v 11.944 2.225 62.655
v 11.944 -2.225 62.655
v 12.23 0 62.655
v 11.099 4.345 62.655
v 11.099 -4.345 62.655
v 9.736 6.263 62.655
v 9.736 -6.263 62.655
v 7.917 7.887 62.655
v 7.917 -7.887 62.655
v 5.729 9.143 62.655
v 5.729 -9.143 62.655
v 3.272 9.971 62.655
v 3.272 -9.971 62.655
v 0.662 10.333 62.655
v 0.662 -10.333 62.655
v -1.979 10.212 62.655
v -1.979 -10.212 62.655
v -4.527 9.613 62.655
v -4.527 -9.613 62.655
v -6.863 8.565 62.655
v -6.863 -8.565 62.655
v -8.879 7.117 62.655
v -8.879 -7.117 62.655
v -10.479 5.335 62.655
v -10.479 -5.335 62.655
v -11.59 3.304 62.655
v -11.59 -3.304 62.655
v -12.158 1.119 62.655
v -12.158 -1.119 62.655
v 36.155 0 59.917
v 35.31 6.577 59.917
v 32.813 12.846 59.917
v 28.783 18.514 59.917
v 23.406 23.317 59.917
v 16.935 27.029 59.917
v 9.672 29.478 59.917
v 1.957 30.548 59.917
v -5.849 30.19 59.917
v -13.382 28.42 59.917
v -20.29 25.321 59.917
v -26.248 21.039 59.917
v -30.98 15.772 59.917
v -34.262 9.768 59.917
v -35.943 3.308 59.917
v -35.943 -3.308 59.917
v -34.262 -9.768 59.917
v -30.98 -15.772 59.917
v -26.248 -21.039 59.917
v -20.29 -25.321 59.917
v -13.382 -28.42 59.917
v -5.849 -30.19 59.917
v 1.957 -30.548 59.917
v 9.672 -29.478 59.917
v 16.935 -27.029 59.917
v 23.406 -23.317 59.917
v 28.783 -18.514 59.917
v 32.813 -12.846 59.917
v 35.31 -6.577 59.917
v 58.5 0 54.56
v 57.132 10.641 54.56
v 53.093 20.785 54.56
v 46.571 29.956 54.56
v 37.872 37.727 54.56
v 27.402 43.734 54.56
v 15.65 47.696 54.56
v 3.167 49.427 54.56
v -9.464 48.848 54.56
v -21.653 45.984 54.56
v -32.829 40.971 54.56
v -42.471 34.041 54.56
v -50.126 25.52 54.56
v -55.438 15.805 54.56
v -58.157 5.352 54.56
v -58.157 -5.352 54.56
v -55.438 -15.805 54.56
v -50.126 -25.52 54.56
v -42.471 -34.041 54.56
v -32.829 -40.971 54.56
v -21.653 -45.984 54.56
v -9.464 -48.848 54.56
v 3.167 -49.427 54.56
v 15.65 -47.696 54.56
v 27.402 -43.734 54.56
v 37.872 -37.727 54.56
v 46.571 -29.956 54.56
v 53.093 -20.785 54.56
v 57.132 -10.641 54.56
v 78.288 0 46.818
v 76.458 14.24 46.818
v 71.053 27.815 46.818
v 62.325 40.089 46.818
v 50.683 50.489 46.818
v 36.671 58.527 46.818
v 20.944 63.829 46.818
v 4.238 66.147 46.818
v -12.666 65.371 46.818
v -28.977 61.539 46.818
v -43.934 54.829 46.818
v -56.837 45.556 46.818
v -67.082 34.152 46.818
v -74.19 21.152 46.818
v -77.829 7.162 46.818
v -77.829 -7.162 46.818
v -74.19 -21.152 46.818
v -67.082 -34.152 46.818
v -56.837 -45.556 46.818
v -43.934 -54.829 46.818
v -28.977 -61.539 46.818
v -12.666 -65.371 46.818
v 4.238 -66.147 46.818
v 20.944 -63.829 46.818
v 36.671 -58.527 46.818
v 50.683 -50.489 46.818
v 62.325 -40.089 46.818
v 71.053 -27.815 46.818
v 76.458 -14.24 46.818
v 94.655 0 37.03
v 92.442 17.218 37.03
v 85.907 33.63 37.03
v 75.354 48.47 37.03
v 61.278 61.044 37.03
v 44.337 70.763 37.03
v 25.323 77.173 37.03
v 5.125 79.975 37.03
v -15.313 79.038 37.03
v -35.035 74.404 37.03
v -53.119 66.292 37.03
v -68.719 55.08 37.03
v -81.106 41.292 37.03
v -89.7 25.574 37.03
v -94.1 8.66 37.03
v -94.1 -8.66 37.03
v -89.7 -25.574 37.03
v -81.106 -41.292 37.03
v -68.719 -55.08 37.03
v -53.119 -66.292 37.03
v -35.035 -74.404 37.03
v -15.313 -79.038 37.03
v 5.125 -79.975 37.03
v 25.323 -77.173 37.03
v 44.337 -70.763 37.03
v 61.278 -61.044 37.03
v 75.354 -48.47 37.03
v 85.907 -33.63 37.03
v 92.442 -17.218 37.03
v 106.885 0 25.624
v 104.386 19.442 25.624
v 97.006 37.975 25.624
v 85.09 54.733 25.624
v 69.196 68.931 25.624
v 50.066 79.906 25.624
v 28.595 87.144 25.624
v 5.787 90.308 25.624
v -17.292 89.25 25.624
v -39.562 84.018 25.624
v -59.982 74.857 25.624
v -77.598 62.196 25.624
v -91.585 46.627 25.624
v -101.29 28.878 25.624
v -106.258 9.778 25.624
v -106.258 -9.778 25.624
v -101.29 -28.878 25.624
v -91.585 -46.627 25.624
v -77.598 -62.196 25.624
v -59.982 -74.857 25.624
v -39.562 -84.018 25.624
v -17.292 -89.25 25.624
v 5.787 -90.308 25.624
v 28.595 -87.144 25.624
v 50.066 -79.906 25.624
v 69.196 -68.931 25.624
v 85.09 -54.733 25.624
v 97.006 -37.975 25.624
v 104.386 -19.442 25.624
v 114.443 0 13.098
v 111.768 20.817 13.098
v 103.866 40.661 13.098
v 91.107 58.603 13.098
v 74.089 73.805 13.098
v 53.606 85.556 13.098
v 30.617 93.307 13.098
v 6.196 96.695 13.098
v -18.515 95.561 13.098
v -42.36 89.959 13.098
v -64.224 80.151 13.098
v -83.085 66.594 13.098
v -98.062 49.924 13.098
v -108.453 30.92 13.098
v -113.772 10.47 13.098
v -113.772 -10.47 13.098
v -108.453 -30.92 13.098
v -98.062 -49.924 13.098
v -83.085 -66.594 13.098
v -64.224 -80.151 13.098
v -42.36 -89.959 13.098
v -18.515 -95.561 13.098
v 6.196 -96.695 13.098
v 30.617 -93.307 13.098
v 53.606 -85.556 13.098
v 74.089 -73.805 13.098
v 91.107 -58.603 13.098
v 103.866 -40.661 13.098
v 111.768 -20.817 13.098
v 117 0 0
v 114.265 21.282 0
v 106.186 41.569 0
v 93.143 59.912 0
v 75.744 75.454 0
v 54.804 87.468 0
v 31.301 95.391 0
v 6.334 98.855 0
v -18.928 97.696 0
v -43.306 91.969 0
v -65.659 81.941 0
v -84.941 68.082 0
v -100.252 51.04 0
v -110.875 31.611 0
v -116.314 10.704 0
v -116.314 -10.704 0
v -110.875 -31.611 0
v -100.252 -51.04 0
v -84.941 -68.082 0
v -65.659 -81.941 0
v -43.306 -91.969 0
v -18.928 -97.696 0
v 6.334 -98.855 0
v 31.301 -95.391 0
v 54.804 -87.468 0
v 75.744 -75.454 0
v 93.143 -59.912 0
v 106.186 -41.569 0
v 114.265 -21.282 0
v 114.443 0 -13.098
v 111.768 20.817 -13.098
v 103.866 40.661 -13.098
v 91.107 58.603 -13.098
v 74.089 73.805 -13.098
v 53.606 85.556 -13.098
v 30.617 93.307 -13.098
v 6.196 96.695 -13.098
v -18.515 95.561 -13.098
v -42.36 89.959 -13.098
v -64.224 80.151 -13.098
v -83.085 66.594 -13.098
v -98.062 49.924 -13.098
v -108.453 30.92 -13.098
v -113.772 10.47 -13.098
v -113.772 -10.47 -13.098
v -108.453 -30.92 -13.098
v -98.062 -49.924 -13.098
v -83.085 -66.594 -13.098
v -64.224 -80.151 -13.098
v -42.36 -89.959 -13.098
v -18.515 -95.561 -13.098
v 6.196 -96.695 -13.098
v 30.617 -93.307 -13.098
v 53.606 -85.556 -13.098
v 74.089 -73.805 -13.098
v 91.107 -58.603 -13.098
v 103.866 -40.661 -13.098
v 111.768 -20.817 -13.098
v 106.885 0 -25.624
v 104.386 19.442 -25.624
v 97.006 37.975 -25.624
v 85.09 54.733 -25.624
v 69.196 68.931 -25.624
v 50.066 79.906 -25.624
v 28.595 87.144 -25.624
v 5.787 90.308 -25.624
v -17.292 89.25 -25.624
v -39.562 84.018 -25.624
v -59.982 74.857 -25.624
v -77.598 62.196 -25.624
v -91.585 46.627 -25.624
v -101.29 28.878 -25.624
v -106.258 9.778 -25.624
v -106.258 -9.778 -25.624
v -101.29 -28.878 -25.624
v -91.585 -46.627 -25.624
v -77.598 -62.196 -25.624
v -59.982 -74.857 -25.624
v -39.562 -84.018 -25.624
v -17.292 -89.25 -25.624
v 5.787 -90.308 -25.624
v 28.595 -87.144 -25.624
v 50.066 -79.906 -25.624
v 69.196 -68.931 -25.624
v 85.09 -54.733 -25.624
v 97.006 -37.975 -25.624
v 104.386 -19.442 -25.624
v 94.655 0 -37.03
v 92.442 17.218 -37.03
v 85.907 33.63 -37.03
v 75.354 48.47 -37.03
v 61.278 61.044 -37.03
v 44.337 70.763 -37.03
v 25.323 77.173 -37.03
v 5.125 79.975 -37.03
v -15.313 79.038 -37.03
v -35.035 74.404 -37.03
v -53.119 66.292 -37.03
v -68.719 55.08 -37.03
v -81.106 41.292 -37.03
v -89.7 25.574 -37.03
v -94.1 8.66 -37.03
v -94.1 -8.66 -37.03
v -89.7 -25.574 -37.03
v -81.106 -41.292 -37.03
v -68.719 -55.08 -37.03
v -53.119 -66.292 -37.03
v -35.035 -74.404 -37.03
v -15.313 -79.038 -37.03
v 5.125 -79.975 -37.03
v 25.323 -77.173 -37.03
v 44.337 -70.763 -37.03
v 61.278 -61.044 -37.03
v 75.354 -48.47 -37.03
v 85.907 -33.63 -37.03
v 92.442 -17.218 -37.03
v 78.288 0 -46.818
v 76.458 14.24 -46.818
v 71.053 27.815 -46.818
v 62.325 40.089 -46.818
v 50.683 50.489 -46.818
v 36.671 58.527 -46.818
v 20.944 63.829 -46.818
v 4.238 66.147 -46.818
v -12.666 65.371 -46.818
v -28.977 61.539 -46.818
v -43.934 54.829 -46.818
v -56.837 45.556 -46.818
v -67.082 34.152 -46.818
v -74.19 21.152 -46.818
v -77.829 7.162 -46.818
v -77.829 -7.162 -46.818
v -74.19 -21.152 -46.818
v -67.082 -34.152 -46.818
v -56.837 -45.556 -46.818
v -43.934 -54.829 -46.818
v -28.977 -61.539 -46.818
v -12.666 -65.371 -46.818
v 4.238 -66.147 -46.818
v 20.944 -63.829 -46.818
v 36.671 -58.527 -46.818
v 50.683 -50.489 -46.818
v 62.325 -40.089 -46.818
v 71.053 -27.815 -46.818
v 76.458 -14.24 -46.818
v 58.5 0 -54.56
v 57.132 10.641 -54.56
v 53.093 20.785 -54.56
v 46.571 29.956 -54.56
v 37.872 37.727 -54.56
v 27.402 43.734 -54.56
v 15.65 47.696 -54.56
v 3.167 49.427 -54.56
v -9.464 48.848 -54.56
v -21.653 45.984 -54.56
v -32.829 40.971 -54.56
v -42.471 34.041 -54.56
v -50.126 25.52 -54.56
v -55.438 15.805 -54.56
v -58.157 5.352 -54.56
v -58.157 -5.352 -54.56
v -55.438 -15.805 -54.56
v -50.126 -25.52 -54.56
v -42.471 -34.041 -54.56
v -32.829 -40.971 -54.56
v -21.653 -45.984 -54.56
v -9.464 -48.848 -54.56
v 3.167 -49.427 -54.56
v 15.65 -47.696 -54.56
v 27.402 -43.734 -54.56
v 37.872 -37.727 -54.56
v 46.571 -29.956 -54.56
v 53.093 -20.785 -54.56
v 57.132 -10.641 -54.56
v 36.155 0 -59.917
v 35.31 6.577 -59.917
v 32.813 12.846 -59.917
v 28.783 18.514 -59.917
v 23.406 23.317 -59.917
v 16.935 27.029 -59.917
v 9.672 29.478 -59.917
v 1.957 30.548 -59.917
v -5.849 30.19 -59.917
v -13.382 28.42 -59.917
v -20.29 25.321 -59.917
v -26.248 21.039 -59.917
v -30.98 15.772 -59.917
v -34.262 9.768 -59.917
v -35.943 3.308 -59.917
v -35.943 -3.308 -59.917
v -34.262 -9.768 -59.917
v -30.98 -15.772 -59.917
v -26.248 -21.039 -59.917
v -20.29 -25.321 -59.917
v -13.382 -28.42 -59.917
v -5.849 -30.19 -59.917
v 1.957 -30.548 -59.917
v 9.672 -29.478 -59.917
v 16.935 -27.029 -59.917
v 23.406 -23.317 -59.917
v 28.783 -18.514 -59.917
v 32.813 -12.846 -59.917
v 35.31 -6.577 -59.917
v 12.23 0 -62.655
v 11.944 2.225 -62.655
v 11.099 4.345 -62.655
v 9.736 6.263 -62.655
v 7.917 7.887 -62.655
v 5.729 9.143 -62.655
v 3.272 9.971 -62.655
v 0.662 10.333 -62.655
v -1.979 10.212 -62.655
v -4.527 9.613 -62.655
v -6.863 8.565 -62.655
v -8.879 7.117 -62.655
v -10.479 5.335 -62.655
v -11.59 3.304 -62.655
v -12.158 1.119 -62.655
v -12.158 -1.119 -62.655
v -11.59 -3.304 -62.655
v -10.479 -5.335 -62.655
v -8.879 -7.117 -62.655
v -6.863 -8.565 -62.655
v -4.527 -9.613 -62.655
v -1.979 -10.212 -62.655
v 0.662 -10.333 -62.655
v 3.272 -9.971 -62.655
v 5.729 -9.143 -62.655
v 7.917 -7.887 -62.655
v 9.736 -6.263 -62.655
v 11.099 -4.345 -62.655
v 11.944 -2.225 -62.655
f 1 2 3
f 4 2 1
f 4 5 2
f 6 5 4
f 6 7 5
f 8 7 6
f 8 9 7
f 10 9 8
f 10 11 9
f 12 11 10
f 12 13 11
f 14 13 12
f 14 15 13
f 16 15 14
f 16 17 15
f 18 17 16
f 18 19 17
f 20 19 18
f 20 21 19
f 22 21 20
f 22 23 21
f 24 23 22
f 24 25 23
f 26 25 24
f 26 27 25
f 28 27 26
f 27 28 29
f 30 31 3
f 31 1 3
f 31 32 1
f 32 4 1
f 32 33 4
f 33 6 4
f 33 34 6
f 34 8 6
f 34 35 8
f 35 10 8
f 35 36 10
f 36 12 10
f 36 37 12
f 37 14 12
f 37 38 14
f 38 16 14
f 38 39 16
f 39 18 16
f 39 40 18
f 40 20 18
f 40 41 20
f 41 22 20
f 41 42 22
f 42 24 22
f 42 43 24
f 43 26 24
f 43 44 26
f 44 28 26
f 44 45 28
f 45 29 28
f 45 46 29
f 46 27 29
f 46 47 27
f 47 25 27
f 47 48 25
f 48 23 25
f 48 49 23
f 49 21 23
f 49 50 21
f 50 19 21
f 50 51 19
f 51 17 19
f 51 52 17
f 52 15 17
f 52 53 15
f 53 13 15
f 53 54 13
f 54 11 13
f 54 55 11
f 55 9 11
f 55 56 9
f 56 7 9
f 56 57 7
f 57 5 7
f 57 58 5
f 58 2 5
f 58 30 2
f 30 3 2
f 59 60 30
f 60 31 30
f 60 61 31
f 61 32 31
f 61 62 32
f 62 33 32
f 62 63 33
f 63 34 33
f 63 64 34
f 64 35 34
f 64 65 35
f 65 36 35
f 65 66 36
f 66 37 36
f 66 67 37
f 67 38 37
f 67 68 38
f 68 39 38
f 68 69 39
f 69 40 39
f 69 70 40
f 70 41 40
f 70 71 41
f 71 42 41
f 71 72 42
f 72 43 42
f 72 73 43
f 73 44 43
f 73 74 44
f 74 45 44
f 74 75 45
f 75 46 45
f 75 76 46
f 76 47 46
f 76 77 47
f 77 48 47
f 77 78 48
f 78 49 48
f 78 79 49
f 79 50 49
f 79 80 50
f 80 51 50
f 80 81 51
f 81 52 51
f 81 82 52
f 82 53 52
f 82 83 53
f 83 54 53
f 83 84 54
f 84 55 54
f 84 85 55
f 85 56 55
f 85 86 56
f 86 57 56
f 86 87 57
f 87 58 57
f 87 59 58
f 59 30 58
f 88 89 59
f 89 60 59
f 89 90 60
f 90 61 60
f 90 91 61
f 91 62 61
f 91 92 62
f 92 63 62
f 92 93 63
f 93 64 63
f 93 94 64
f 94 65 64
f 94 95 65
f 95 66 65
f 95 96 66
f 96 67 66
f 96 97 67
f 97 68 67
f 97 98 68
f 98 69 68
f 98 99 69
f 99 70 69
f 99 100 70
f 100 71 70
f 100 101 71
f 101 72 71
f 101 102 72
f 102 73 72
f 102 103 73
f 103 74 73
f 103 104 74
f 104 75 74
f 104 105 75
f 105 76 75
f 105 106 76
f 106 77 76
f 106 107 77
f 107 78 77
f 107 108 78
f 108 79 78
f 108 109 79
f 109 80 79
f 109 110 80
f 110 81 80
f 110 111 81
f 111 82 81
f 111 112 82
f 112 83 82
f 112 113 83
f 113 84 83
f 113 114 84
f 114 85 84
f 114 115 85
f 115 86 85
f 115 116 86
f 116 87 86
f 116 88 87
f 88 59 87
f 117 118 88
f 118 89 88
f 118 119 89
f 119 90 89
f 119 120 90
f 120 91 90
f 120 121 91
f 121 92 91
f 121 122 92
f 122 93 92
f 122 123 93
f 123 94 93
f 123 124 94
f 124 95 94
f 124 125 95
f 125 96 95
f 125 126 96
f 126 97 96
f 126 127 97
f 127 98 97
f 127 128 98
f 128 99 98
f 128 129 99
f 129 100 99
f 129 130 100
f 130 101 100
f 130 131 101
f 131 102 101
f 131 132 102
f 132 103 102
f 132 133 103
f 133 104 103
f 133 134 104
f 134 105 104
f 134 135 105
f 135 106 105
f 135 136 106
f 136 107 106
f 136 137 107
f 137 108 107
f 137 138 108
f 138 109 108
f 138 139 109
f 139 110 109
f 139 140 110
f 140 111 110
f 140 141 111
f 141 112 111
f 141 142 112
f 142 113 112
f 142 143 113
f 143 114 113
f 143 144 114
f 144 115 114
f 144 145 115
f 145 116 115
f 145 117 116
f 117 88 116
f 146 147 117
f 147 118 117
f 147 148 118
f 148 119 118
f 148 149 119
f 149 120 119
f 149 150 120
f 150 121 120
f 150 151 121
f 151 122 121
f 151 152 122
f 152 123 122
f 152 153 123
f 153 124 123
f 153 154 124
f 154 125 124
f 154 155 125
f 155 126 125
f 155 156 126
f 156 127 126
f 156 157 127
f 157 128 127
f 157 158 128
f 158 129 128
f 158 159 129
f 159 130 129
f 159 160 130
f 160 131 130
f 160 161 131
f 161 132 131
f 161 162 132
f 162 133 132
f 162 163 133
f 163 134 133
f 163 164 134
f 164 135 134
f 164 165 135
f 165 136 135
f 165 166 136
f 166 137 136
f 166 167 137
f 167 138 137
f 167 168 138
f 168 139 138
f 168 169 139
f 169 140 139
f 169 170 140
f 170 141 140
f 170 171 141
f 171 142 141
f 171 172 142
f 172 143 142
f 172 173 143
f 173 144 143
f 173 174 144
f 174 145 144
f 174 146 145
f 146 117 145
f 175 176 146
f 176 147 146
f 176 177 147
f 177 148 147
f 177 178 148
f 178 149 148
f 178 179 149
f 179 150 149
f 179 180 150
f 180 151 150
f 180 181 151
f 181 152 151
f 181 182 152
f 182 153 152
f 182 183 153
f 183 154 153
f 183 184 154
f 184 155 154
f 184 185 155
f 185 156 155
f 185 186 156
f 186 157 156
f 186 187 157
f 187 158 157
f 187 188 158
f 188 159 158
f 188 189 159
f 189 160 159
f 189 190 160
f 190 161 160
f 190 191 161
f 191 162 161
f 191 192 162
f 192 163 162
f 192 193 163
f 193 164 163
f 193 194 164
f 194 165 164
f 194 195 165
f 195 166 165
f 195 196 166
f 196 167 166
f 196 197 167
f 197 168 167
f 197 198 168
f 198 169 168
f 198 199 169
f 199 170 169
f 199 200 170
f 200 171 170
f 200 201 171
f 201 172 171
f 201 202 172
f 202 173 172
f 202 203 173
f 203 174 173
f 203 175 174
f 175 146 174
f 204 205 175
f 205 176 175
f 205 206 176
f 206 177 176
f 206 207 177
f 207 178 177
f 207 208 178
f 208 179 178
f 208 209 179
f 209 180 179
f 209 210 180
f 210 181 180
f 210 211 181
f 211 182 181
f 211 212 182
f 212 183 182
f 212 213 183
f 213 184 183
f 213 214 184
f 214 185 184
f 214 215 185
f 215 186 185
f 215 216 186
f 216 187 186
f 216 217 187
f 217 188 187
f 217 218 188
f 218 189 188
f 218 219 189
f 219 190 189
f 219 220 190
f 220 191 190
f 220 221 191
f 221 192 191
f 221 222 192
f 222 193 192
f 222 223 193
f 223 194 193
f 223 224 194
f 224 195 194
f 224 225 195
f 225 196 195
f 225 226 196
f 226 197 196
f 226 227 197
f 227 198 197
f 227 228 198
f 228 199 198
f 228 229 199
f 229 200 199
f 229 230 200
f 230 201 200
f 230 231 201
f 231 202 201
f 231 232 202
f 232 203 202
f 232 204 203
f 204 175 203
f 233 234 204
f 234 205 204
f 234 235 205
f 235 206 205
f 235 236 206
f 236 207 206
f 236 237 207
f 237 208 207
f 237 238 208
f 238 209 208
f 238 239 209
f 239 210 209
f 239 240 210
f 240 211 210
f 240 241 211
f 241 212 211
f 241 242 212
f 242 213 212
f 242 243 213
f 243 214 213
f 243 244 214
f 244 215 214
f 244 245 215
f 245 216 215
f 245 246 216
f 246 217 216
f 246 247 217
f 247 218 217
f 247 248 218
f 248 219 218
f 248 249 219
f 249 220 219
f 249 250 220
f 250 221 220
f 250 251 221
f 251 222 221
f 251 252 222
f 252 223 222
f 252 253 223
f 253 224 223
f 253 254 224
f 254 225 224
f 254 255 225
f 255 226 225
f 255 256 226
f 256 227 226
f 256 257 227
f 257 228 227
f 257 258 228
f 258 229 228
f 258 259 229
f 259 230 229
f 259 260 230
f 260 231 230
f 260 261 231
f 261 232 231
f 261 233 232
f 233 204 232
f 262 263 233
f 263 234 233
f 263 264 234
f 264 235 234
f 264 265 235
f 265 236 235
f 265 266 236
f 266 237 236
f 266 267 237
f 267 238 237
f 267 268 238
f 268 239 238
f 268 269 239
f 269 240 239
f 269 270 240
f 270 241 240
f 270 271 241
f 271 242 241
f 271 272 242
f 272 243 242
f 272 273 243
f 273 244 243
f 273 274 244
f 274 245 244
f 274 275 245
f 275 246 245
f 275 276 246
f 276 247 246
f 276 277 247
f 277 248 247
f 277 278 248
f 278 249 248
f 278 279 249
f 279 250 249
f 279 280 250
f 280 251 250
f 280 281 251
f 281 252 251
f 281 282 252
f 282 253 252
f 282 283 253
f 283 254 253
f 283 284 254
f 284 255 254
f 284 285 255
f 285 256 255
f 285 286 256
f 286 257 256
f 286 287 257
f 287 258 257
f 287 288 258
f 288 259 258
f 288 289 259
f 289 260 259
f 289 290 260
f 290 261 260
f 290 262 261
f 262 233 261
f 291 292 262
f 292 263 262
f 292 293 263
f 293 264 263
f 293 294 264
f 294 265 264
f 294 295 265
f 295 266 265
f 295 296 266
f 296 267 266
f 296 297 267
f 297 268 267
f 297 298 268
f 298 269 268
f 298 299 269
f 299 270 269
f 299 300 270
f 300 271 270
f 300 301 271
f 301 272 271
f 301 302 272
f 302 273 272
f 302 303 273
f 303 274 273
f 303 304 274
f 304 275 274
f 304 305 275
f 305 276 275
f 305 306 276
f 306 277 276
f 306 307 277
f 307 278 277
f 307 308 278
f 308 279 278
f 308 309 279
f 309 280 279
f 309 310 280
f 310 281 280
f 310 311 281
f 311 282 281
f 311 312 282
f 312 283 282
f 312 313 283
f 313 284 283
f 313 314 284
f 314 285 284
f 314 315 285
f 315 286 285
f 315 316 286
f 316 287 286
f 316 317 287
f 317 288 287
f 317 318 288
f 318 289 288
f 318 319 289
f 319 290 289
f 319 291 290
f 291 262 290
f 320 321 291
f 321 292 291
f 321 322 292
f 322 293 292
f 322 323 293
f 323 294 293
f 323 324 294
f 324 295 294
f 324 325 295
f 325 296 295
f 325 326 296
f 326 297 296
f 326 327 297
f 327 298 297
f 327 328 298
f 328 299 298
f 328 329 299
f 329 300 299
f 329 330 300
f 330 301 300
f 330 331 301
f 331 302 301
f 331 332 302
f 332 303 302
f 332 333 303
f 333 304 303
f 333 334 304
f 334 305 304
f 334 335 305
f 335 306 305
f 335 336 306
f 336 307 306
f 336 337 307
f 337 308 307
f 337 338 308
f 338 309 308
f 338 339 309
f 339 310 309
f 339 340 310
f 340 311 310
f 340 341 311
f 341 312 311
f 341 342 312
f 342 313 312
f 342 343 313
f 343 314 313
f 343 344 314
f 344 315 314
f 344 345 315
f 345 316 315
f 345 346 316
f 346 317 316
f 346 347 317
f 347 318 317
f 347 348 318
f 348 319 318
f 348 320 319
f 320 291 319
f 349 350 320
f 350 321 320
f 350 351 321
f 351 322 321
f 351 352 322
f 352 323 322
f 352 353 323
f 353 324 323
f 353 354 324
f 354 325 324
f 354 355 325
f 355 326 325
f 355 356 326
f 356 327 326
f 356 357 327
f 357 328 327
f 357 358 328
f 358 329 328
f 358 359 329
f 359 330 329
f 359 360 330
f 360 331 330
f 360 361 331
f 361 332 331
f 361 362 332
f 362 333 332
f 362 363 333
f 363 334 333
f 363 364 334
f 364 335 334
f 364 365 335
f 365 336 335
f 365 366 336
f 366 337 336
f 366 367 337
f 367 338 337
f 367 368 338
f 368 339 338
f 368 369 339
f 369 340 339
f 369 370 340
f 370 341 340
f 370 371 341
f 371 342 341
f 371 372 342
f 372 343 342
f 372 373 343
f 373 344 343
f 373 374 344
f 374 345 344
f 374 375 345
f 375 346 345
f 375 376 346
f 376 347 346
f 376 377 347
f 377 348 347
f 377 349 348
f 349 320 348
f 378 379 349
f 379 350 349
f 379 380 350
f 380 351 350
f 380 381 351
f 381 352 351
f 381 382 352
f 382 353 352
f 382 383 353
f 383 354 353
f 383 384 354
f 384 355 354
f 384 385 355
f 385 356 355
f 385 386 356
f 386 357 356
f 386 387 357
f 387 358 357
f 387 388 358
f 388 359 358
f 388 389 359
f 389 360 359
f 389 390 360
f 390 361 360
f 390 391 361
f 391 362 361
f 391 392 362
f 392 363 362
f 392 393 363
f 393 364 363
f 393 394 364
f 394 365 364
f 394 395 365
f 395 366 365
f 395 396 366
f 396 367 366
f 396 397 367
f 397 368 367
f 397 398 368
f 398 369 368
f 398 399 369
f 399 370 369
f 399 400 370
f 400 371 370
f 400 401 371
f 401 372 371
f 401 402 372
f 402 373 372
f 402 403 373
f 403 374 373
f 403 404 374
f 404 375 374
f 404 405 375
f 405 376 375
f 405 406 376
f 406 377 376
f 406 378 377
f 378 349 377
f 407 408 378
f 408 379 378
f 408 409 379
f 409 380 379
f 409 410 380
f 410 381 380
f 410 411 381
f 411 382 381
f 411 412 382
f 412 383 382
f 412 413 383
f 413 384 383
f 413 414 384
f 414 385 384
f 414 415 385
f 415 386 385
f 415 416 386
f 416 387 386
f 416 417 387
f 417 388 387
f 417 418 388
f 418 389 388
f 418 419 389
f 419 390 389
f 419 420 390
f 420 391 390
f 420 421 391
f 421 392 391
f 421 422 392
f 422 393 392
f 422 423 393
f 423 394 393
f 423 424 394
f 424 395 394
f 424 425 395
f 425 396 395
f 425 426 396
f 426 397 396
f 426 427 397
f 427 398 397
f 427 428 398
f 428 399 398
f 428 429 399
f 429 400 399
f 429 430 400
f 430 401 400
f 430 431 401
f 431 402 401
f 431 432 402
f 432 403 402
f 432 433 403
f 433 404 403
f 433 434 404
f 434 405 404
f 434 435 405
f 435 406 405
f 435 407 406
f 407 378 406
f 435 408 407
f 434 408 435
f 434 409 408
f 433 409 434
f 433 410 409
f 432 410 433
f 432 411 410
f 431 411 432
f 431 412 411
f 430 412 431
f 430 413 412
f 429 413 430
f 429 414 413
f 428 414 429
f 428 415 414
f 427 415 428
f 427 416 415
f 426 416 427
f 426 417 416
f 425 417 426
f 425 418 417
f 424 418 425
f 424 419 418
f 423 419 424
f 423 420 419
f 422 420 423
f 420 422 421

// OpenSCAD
// Generated by SolidPython 1.0.1 on 2020-07-29 00:46:50


scale(v = [13, 11, 7]) {
	sphere(r = 9);
}
/***********************************************
*********      SolidPython code:      **********
************************************************
 
# import packages: SolidPython
from solid import *
from solid.utils import *
from itertools import chain, combinations, permutations


class Resize:

    def __init__(self, scad_file):
        self.scad_file = scad_file
        #self.scad_file = import_scad(scad_file)
        # cone/cylinder param:
        self.r1 = 0
        self.r2 = 0
        self.h = 0
        # rectangular prism param:
        self.w = 0
        self.l = 0
        # ellipse param:
        self.r = 0

    # import OpenScad code (file name corresponds to shape)


    # classify shape + parameters
    def assign(self, param1, param2, param3):
        if self.scad_file == 'cone.scad':
            self.r1 = param1
            self.r2 = param2
            self.h = param3
        elif self.scad_file == 'cylinder.scad':
            self.r1 = param1
            self.r2 = param2
            self.h = param3
        elif self.scad_file == 'rectangularPrism.scad':
            self.h = param1
            self.l = param2
            self.w = param3
        else:
            self.r = param1
            self.h = param2

    # resize parameters
    def iterate(self):
        x = range(3, 20, 2)
        i = 1
        if self.scad_file == 'cone.scad':
            tempList = list(permutations(x, 2))
            for temp in tempList:
                param1 = temp[0]
                param2 = temp[1]
                filepath = 'produced_scad_files/' + 'cone' + str(param1) + '_' + str(param2) + '_' + '.scad'
                scad_render_to_file(cylinder(h=param1, r1=param2, r2=0), filepath)

        elif self.scad_file == 'cylinder.scad':
            tempList = list(permutations(x, 3))
            for temp in tempList:
                param1 = temp[0]
                param2 = temp[1]
                filepath = 'produced_scad_files/' + 'cylinder' + str(param1) + '_' + str(param2) + '_' + '.scad'
                scad_render_to_file(cylinder(h=param1, r1=param2, r2=param2), filepath)

        elif self.scad_file == 'rectangularPrism.scad':
            tempList = list(permutations(x, 3))
            for temp in tempList:
                param1 = temp[0]
                param2 = temp[1]
                param3 = temp[2]
                filepath = 'produced_scad_files/' + 'rectangularPrism' + str(param1) + '_' + str(param2) + '_' + str(
                    param3) + '.scad'
                scad_render_to_file(cube(size=(param1, param2, param3)), filepath)

        elif self.scad_file == 'ellipse.scad':
            tempList = list(permutations(x, 4))
            for temp in tempList:
                param1 = temp[0]
                param2 = temp[1]
                param3 = temp[2]
                param4 = temp[3]
                filepath = 'produced_scad_files/' + 'ellipse' + str(param1) + '_' + str(param2) + '_' + str(param3) + '_' + str(param4) + '.scad'
                scad_render_to_file(scale([param1, param2, param3])(sphere(r=param4)), filepath)

    def render_to_scadfile(self):
        scad_render_to_file(scad, 'example.scad') 
 
************************************************/
